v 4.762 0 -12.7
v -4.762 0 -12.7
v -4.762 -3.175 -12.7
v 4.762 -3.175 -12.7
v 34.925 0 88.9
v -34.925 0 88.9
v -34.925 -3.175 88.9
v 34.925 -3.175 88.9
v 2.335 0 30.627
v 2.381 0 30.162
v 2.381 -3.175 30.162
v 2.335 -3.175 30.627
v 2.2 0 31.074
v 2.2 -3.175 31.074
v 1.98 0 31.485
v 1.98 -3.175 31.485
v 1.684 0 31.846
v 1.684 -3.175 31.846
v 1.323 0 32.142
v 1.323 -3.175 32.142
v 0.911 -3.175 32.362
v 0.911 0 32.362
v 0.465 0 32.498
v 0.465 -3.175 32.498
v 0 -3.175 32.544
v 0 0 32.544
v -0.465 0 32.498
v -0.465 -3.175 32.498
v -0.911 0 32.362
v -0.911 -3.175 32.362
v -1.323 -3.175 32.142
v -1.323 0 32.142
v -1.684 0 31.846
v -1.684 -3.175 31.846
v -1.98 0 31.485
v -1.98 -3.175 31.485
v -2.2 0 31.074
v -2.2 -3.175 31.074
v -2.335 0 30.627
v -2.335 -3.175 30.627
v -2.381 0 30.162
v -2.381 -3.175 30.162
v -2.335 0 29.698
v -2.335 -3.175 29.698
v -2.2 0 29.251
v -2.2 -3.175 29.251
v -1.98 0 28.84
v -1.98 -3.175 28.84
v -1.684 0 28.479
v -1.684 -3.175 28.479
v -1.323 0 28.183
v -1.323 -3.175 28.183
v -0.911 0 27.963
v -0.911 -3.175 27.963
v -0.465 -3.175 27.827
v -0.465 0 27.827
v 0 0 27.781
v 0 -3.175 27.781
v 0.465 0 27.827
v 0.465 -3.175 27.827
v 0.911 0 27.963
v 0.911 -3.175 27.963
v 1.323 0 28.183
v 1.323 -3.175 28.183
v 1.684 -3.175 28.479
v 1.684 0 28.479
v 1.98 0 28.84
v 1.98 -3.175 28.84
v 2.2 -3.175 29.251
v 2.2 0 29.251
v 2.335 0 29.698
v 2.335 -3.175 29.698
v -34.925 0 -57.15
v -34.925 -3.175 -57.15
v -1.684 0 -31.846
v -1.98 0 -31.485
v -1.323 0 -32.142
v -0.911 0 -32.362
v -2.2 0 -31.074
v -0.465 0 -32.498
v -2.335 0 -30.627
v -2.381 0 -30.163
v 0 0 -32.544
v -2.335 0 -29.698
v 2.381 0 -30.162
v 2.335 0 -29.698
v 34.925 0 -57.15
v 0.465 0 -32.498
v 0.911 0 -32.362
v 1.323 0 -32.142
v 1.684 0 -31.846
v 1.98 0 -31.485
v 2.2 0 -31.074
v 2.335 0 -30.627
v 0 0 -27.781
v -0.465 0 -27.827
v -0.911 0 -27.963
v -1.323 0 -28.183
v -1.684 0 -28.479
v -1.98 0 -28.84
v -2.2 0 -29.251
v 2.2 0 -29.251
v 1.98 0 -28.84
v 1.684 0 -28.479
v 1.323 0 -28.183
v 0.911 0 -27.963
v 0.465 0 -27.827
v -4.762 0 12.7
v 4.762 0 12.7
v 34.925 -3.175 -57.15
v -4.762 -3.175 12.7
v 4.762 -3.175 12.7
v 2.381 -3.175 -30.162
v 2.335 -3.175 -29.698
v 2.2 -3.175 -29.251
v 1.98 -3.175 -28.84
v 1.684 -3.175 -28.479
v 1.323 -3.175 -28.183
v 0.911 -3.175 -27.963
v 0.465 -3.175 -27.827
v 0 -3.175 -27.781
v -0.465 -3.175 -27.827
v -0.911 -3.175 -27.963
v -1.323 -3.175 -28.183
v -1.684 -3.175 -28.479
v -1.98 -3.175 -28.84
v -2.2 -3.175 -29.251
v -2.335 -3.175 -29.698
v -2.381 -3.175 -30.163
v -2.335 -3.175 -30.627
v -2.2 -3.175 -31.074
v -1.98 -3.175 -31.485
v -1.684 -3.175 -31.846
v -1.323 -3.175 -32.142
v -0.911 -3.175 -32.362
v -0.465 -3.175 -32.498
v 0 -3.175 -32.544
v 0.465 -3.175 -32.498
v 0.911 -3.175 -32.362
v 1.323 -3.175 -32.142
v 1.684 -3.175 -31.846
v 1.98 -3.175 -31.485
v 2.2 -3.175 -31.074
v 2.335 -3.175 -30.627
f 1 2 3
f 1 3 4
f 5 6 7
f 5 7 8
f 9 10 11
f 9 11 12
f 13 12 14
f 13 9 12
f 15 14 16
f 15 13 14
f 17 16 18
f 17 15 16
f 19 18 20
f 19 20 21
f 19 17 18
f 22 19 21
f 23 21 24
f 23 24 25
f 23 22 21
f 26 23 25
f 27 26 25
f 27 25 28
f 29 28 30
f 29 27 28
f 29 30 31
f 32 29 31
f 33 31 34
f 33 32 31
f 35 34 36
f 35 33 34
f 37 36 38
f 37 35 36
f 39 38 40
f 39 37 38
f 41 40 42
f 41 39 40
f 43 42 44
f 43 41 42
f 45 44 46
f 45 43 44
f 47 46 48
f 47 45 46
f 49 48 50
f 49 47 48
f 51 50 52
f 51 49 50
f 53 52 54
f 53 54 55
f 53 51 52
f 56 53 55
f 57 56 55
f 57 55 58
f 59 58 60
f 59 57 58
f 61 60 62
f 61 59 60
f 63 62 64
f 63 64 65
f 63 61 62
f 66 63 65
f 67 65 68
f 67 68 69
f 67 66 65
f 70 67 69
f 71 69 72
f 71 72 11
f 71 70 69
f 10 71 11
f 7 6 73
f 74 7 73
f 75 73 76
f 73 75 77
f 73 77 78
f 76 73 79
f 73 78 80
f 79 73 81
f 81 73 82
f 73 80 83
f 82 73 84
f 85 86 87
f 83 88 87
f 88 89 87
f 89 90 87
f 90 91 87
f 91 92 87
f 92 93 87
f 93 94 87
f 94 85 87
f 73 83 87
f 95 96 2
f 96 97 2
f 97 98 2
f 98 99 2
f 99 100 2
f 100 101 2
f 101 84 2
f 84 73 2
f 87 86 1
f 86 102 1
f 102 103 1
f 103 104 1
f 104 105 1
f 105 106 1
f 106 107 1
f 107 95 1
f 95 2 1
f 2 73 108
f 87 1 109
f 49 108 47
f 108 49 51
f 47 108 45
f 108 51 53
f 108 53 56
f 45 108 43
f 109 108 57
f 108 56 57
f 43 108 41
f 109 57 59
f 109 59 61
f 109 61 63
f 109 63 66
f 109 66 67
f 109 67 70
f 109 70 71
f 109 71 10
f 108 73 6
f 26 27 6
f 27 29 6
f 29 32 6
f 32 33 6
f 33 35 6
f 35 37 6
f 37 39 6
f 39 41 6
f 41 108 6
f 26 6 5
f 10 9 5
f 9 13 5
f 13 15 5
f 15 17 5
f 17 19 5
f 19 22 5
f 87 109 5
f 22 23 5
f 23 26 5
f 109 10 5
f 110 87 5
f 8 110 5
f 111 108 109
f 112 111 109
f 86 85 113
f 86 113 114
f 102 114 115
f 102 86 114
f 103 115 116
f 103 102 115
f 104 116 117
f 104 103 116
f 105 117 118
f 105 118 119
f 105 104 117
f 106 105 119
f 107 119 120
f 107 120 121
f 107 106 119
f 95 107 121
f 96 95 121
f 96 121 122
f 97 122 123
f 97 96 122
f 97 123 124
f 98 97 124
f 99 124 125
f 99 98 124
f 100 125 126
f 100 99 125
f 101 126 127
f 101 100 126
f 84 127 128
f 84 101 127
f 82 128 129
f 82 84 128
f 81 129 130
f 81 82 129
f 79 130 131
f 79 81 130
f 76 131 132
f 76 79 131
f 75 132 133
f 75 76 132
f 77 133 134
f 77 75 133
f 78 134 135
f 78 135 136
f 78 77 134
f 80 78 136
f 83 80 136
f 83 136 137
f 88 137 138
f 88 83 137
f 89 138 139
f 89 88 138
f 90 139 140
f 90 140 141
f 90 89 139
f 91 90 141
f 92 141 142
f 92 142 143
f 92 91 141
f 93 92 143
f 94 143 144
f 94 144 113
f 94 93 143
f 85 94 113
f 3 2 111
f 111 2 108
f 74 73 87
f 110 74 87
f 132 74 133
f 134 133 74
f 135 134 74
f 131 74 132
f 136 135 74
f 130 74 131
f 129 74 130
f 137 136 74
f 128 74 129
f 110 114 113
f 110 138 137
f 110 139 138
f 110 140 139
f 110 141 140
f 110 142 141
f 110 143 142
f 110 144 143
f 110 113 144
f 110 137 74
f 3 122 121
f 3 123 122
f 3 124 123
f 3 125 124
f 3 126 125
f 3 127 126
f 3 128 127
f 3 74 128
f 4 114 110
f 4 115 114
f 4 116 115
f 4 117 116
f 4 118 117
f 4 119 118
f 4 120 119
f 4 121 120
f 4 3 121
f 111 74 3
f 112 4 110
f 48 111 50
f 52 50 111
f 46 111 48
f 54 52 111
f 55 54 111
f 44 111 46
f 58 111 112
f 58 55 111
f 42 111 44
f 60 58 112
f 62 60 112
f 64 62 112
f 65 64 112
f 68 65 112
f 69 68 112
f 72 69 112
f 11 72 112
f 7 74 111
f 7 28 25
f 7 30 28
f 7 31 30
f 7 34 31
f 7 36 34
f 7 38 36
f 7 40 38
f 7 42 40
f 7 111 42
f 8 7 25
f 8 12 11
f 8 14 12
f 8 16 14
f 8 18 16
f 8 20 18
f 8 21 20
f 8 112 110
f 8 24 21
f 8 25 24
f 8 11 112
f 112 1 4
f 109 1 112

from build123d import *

# Parameters (mm, degrees)
F0_W     = 69.85
F0_H     = 114.3
F0_R     = 2.38125
F0_W_2   = 9.525
F0_H_2   = 25.4
F0_H_3   = 31.75
F1_DEPTH = 3.175


with BuildPart() as f1:
    # F0 (on Front) → F1 (new body)
    with BuildSketch(Plane.XZ):
        Rectangle(F0_W, F0_H)
        with Locations((0, -30.1625)):
            Circle(F0_R, mode=Mode.SUBTRACT)
        Rectangle(F0_W_2, F0_H_2, mode=Mode.SUBTRACT)
        with Locations((0, 30.1625)):
            Circle(F0_R, mode=Mode.SUBTRACT)
        with Locations((0, 73.025)):
            Rectangle(F0_W, F0_H_3)
    extrude(amount=F1_DEPTH)


solid = f1.part
